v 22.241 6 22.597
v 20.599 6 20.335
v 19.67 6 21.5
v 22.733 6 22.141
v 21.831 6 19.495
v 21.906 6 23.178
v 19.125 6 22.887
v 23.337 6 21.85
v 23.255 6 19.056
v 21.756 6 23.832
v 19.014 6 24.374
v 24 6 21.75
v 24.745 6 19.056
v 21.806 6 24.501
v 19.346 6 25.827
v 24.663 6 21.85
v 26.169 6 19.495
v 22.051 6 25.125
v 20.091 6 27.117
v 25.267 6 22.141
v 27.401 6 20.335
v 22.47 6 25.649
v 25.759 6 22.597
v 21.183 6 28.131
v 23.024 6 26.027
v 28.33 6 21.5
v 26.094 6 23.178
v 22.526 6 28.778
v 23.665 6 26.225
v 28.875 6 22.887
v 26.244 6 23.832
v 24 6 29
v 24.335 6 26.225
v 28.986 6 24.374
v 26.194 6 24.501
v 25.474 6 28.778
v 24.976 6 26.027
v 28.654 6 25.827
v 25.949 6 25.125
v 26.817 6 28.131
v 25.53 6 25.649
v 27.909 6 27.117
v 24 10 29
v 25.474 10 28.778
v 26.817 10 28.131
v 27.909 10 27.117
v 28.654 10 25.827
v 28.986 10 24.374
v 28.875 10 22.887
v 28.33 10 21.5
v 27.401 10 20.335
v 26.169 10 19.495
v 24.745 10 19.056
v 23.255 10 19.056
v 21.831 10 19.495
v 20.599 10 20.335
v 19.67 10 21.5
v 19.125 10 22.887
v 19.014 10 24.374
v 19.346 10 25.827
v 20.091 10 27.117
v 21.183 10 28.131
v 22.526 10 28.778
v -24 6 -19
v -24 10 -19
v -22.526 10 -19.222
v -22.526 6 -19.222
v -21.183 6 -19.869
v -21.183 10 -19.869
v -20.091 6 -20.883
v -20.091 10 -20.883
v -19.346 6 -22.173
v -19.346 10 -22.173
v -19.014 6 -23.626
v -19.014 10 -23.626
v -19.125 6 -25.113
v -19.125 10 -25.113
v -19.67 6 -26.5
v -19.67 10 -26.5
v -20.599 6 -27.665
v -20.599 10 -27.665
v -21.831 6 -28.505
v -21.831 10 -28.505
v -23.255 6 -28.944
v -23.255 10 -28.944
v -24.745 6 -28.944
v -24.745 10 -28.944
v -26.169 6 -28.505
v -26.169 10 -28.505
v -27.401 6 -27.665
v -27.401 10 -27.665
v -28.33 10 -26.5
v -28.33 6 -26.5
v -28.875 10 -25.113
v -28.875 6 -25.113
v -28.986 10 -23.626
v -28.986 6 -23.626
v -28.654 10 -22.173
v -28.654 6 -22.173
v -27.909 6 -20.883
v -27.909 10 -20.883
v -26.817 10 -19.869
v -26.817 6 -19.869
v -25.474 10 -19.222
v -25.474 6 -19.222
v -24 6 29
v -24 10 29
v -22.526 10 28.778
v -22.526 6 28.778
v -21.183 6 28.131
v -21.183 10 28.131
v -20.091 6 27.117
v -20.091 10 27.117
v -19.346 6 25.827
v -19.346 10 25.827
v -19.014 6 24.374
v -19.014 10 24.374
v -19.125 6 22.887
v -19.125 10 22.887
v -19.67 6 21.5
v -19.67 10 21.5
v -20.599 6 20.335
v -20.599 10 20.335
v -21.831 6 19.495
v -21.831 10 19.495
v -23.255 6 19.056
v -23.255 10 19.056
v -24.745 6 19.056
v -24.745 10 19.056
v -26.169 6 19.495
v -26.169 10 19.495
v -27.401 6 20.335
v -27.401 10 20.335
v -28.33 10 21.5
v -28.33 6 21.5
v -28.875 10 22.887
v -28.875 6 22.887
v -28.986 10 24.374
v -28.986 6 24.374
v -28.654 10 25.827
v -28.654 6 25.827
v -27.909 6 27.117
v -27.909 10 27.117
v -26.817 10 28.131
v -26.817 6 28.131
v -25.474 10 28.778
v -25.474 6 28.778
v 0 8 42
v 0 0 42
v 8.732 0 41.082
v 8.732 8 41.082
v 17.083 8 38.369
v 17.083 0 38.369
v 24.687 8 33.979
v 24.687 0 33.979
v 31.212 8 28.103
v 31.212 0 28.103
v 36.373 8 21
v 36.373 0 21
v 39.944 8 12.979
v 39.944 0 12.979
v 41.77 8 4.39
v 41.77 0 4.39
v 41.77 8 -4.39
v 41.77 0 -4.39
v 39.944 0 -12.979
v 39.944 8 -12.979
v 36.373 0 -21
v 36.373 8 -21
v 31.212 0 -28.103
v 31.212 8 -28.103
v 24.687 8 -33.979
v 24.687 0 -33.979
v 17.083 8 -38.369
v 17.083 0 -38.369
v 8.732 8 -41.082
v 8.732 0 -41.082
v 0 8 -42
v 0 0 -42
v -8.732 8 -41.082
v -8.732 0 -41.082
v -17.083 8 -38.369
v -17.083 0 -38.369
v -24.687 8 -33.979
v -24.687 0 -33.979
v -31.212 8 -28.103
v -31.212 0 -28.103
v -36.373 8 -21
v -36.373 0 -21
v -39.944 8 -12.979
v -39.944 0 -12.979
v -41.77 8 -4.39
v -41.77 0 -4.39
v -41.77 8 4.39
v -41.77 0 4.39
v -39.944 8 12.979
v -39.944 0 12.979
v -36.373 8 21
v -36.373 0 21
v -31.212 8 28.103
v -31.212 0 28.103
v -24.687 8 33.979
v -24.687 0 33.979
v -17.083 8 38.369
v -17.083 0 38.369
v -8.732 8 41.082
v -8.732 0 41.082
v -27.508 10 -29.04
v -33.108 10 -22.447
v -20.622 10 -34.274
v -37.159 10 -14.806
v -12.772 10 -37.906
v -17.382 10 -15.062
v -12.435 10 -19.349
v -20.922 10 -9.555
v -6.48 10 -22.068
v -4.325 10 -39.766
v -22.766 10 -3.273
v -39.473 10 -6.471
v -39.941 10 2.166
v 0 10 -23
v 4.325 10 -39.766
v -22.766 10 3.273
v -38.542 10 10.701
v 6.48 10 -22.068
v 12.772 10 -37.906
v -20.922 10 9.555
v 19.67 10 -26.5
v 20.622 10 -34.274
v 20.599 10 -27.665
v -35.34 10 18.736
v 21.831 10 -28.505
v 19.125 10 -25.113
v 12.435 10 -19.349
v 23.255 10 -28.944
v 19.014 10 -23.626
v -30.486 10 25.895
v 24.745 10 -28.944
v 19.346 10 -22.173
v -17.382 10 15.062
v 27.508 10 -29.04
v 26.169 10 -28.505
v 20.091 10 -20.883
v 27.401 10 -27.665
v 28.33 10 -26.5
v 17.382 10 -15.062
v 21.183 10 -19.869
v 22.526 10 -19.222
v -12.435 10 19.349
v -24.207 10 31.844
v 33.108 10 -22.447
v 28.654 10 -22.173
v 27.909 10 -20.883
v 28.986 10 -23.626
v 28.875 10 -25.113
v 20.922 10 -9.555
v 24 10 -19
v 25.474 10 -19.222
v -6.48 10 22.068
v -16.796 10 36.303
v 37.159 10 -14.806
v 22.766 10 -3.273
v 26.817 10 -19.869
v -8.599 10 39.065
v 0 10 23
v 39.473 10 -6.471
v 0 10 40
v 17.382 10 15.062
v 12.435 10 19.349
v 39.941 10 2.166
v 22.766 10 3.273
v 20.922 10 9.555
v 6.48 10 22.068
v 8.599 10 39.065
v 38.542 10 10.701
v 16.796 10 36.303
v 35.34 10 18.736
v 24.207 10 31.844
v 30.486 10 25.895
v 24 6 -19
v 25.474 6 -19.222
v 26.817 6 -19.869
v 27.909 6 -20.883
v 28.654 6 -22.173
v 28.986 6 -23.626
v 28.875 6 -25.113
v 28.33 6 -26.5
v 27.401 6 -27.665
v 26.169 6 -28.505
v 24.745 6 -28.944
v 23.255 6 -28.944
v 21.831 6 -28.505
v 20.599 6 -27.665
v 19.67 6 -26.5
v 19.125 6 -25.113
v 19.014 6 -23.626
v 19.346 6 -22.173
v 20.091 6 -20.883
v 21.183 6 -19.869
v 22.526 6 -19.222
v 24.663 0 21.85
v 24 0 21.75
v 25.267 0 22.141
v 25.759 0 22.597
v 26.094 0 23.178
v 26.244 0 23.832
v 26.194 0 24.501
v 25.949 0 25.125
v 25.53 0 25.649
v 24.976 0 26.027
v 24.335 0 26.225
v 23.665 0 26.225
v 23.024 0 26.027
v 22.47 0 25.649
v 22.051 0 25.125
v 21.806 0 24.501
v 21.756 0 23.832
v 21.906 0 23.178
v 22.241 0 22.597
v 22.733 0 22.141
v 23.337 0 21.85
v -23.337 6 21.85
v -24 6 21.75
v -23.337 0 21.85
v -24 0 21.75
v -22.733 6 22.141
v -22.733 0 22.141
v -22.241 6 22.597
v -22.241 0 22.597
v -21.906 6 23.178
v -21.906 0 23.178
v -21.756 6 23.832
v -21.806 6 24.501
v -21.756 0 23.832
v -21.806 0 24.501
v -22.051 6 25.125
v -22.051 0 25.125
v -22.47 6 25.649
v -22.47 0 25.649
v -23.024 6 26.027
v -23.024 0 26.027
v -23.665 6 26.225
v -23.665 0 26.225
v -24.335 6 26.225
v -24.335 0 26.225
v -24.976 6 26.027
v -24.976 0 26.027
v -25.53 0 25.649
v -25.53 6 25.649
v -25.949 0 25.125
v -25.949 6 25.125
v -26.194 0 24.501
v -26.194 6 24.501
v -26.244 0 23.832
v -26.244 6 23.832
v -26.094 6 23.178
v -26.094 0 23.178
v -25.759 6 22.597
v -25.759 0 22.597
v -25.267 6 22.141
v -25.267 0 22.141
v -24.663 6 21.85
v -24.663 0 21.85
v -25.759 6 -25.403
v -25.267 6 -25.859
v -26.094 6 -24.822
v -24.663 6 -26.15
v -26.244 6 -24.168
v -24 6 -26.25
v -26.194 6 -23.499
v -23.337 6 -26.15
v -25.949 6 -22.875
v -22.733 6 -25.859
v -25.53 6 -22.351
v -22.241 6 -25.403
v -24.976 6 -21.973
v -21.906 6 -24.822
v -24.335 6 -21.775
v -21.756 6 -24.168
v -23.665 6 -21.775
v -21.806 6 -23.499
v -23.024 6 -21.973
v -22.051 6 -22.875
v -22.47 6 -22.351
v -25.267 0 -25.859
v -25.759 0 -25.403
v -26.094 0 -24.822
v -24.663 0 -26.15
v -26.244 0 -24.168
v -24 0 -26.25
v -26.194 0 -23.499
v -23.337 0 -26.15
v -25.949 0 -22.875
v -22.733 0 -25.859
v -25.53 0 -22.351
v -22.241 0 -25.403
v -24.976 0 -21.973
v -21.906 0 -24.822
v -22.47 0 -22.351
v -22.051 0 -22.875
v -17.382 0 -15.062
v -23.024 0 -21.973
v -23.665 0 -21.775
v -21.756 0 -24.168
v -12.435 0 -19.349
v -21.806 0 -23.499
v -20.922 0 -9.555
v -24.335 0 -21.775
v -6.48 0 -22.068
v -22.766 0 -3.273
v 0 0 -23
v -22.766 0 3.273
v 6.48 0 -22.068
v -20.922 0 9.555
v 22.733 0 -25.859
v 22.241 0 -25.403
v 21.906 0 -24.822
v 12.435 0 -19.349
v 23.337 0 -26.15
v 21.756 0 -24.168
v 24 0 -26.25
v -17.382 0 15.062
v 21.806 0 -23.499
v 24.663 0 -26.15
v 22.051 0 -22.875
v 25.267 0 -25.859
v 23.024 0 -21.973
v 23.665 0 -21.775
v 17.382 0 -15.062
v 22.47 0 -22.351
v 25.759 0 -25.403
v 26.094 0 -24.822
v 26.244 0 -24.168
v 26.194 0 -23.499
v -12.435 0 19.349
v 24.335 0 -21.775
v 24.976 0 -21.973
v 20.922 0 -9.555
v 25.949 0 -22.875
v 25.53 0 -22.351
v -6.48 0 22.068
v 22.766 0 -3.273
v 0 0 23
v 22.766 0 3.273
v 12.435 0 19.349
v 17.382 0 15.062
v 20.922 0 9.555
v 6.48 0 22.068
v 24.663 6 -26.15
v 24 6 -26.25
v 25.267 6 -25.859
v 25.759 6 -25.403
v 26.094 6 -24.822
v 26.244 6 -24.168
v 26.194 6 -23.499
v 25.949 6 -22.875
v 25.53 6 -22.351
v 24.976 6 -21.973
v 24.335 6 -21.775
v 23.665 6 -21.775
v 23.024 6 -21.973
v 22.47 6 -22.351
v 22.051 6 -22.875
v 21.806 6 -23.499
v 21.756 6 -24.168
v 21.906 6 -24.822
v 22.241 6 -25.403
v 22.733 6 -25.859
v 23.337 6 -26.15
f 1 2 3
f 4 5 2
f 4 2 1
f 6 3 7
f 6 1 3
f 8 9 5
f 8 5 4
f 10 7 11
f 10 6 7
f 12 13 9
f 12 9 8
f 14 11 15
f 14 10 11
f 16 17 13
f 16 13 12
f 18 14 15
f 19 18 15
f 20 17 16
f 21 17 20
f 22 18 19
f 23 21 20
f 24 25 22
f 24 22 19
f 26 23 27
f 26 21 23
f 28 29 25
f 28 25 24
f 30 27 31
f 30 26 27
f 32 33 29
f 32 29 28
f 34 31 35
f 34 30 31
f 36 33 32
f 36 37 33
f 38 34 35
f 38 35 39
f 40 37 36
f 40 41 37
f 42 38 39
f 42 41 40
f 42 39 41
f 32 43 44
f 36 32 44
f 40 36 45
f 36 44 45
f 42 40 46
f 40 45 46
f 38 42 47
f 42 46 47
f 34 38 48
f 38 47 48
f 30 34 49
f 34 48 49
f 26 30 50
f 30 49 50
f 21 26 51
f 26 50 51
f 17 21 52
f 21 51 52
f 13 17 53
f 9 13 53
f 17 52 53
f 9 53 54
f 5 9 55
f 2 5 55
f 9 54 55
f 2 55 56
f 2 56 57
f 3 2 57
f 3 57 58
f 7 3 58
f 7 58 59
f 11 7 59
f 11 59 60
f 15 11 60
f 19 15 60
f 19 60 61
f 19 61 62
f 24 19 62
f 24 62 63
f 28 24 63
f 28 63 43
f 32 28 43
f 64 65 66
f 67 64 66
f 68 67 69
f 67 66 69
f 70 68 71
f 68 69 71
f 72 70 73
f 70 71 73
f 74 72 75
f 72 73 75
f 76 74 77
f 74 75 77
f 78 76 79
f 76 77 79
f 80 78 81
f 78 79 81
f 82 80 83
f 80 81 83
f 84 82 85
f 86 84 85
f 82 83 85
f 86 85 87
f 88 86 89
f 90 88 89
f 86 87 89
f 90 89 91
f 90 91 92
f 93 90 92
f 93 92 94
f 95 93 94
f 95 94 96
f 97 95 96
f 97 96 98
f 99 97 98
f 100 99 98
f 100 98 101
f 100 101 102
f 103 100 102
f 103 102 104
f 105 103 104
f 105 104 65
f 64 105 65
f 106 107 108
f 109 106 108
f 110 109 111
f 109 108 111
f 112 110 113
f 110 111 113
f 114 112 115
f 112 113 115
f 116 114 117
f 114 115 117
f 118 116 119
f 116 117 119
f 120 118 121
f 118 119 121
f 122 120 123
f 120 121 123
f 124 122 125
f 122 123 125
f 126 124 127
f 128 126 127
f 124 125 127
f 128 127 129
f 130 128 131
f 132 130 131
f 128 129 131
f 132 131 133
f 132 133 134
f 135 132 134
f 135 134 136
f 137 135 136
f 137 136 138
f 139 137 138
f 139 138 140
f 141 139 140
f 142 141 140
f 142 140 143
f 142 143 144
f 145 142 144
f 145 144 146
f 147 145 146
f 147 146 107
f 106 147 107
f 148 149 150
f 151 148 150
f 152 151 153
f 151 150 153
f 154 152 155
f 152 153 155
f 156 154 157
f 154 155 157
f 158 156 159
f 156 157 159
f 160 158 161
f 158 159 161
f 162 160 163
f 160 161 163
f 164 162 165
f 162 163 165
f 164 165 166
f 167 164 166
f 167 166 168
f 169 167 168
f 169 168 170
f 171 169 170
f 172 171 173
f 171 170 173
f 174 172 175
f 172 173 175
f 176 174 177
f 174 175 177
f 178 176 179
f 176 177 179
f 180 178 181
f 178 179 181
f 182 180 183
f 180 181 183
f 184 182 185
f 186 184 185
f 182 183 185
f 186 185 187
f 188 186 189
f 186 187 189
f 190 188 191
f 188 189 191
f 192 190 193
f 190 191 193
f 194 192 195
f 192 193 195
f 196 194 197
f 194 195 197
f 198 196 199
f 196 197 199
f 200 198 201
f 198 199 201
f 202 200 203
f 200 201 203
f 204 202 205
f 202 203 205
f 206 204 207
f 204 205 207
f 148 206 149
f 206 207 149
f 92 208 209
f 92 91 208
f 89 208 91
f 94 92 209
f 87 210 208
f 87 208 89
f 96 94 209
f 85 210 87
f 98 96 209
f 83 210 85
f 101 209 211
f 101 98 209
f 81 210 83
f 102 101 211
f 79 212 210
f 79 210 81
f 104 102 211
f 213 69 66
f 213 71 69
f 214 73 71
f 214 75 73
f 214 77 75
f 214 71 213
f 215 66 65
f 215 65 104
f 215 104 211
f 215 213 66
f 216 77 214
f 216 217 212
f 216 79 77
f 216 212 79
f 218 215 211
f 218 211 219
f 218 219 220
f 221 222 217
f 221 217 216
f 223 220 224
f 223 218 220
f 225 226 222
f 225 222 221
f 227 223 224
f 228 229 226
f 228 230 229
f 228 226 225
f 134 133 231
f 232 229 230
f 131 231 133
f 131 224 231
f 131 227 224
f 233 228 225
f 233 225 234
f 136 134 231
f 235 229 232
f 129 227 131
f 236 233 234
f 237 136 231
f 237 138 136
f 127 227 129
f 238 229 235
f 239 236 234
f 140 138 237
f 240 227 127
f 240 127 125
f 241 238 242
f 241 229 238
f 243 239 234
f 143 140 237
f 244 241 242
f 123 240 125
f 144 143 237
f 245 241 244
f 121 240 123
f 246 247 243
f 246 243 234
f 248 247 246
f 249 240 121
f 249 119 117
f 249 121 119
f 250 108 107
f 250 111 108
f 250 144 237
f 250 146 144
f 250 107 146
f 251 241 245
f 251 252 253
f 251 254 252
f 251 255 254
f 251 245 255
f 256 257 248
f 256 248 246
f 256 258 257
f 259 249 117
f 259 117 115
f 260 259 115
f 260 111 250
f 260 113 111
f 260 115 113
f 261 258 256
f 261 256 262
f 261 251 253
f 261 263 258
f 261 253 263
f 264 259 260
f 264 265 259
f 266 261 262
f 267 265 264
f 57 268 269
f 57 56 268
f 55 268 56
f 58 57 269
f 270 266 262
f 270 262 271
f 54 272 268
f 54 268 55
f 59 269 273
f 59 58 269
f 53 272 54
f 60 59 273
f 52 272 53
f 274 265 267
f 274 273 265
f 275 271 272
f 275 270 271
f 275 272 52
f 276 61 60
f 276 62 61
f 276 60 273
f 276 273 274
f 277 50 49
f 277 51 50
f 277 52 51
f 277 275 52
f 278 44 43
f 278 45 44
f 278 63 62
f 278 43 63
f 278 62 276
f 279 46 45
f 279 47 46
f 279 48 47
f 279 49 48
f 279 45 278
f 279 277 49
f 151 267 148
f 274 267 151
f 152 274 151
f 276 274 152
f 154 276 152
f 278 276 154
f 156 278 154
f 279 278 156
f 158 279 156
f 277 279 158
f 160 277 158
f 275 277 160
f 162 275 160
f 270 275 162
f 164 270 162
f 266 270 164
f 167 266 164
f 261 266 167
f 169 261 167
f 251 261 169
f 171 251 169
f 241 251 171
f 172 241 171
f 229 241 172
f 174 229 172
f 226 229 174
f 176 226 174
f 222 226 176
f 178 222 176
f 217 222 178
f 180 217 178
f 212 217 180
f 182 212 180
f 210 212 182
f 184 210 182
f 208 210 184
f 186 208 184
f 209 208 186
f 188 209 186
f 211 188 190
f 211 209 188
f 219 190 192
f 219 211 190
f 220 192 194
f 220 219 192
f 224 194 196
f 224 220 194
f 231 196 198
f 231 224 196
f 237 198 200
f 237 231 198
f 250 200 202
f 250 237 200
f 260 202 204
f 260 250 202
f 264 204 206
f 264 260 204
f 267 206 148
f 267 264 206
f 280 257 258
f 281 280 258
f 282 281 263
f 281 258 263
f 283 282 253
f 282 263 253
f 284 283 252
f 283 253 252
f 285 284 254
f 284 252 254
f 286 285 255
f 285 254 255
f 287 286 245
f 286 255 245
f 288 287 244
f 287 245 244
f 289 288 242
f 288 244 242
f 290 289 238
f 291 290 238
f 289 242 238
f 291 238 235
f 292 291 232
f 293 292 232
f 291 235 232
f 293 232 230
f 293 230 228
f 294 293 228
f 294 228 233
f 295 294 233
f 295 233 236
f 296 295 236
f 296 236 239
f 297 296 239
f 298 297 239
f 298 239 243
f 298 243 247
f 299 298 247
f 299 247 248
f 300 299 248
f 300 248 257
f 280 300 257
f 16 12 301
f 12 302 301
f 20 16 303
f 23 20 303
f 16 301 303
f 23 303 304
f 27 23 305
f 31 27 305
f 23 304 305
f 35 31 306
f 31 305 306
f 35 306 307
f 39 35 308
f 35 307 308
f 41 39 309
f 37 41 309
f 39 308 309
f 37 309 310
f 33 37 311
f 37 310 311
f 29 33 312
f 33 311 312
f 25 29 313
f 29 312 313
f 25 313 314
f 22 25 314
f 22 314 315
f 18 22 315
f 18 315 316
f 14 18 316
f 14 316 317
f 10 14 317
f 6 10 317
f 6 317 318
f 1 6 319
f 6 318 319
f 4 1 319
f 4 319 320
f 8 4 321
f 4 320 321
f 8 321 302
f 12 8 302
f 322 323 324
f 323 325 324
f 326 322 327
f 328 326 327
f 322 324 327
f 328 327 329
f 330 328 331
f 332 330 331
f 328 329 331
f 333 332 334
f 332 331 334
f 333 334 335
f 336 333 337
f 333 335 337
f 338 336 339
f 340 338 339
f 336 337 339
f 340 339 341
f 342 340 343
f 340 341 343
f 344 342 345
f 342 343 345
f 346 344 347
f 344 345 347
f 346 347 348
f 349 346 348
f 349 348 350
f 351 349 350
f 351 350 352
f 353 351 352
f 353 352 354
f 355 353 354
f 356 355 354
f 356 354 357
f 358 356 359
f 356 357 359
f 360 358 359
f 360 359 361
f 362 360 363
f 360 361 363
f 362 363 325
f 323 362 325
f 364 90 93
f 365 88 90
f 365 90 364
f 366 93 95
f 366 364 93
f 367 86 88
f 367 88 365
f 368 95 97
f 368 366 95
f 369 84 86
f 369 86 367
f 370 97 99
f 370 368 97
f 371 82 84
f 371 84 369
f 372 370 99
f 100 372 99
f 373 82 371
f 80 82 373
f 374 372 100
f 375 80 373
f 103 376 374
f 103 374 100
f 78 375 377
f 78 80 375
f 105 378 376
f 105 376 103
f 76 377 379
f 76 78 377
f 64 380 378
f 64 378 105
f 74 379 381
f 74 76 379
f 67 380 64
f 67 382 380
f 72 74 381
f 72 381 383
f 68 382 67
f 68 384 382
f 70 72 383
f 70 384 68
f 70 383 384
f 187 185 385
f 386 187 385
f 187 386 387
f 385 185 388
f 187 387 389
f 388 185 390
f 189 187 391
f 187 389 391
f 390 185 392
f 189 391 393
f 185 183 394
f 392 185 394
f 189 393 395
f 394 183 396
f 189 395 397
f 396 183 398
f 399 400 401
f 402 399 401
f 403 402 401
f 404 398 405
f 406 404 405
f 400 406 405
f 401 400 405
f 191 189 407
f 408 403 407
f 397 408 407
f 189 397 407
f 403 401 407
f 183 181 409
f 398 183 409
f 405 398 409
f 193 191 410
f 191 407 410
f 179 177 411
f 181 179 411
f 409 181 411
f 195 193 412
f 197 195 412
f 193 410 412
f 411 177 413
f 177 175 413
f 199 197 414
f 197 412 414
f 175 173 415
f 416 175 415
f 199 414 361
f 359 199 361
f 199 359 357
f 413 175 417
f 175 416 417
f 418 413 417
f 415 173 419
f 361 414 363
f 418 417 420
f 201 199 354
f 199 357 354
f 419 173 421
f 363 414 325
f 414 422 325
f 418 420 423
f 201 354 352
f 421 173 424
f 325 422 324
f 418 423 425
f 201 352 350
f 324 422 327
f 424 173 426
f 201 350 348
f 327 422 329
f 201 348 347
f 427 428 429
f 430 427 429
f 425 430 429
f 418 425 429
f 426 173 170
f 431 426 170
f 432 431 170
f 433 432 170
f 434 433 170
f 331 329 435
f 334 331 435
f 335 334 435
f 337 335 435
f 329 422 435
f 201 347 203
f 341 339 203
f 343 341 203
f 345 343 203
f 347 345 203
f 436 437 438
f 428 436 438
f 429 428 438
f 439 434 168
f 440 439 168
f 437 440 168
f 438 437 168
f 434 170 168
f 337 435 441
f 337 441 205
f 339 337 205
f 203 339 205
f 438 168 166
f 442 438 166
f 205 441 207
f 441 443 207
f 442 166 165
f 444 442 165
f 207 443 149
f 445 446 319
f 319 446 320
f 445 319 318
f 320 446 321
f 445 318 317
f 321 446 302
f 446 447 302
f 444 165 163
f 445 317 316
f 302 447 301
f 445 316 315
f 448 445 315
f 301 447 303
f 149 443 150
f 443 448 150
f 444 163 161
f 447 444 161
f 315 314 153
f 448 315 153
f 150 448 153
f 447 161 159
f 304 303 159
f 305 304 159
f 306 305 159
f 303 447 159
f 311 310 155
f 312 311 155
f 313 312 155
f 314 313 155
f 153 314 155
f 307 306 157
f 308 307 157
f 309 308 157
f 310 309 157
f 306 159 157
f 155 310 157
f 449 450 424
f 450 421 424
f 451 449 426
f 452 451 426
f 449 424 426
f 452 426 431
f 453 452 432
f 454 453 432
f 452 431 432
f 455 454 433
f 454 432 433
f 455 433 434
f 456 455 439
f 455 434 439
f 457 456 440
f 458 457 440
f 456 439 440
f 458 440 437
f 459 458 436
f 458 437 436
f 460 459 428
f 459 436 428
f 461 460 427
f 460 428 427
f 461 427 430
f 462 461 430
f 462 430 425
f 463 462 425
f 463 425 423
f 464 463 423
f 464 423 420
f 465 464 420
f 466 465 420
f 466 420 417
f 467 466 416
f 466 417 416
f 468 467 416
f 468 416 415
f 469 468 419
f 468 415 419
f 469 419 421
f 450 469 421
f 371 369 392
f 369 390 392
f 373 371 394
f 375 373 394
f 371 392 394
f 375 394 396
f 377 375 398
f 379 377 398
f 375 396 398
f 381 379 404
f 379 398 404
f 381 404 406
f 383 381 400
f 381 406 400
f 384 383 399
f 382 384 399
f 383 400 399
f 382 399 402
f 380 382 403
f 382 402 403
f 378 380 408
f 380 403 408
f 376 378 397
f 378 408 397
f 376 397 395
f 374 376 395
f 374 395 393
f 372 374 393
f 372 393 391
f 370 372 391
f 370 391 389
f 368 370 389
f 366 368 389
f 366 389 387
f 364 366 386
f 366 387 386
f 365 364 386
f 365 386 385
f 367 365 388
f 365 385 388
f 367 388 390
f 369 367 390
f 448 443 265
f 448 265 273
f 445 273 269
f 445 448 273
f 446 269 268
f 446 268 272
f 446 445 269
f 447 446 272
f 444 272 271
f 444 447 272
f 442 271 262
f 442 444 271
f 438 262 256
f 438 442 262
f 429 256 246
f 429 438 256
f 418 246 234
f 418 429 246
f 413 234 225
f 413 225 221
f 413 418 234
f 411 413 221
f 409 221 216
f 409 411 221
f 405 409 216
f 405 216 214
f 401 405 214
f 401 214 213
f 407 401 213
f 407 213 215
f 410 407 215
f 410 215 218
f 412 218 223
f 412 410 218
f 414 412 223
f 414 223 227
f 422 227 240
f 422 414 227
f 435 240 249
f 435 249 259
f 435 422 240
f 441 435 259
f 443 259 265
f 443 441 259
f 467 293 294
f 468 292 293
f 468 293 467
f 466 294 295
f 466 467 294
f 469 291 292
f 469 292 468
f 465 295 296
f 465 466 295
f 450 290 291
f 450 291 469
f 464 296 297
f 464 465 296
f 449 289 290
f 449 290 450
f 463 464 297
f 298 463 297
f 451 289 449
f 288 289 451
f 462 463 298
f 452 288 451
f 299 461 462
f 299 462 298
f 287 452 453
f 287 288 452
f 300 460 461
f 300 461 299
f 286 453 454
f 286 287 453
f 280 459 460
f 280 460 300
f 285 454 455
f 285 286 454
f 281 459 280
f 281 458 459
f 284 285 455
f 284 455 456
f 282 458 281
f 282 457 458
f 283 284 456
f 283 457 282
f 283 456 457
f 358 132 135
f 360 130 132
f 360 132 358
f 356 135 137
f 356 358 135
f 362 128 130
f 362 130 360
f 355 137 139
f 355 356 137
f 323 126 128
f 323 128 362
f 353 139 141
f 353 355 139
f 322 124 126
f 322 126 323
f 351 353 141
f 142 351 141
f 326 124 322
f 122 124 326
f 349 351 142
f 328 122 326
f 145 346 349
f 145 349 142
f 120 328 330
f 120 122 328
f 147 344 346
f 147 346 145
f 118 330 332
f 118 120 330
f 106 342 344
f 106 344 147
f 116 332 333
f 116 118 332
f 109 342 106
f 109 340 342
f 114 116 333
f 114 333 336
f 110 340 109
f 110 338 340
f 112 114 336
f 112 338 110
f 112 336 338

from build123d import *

# Parameters (mm, degrees)
SKETCH1_R                               = 42
SKETCH1_R_2                             = 23
EXTRUDE1_DEPTH                          = 10
CBORE_FOR_M4_HEX_HEAD_BOLT1_D           = 4.5
CBORE_FOR_M4_HEX_HEAD_BOLT1_DEPTH       = 19.75
CBORE_FOR_M4_HEX_HEAD_BOLT1_CBORE_D     = 10
CBORE_FOR_M4_HEX_HEAD_BOLT1_CBORE_DEPTH = 4
CBORE_FOR_M4_HEX_HEAD_BOLT1_TIP         = 1.351936393
CHAMFER2_SIZE                           = 2


with BuildPart() as part:
    # Sketch1 → Extrude1 (new body)
    with BuildSketch(Plane(origin=(0, 0, 0), x_dir=(1, 0, 0), z_dir=(0, 1, 0))):
        with Locations(Location((0, 0, 0), (0, 0, 270))):
            Circle(SKETCH1_R)
        with Locations(Location((0, 0, 0), (0, 0, 270))):
            Circle(SKETCH1_R_2, mode=Mode.SUBTRACT)
    extrude(amount=EXTRUDE1_DEPTH)

    # CBORE for M4 Hex Head Bolt1
    with Locations(Plane(origin=(-24, 10, -24), x_dir=(0, 0, 1), z_dir=(0, 1, 0))):
        with Locations((0, 0), (0, 48), (48, 48), (48, 0)):
            CounterBoreHole(CBORE_FOR_M4_HEX_HEAD_BOLT1_D / 2, CBORE_FOR_M4_HEX_HEAD_BOLT1_CBORE_D / 2, CBORE_FOR_M4_HEX_HEAD_BOLT1_CBORE_DEPTH, depth=CBORE_FOR_M4_HEX_HEAD_BOLT1_DEPTH)
            with Locations((0, 0, -(CBORE_FOR_M4_HEX_HEAD_BOLT1_DEPTH + CBORE_FOR_M4_HEX_HEAD_BOLT1_TIP / 2))):  # 118° drill point
                Cone(0, CBORE_FOR_M4_HEX_HEAD_BOLT1_D / 2, CBORE_FOR_M4_HEX_HEAD_BOLT1_TIP, mode=Mode.SUBTRACT)

    # Chamfer2
    chamfer2_edges = [part.edges().sort_by_distance(p)[0] for p in [
        (0, 10, -42),
    ]]
    chamfer(chamfer2_edges, length=CHAMFER2_SIZE)


solid = part.part
